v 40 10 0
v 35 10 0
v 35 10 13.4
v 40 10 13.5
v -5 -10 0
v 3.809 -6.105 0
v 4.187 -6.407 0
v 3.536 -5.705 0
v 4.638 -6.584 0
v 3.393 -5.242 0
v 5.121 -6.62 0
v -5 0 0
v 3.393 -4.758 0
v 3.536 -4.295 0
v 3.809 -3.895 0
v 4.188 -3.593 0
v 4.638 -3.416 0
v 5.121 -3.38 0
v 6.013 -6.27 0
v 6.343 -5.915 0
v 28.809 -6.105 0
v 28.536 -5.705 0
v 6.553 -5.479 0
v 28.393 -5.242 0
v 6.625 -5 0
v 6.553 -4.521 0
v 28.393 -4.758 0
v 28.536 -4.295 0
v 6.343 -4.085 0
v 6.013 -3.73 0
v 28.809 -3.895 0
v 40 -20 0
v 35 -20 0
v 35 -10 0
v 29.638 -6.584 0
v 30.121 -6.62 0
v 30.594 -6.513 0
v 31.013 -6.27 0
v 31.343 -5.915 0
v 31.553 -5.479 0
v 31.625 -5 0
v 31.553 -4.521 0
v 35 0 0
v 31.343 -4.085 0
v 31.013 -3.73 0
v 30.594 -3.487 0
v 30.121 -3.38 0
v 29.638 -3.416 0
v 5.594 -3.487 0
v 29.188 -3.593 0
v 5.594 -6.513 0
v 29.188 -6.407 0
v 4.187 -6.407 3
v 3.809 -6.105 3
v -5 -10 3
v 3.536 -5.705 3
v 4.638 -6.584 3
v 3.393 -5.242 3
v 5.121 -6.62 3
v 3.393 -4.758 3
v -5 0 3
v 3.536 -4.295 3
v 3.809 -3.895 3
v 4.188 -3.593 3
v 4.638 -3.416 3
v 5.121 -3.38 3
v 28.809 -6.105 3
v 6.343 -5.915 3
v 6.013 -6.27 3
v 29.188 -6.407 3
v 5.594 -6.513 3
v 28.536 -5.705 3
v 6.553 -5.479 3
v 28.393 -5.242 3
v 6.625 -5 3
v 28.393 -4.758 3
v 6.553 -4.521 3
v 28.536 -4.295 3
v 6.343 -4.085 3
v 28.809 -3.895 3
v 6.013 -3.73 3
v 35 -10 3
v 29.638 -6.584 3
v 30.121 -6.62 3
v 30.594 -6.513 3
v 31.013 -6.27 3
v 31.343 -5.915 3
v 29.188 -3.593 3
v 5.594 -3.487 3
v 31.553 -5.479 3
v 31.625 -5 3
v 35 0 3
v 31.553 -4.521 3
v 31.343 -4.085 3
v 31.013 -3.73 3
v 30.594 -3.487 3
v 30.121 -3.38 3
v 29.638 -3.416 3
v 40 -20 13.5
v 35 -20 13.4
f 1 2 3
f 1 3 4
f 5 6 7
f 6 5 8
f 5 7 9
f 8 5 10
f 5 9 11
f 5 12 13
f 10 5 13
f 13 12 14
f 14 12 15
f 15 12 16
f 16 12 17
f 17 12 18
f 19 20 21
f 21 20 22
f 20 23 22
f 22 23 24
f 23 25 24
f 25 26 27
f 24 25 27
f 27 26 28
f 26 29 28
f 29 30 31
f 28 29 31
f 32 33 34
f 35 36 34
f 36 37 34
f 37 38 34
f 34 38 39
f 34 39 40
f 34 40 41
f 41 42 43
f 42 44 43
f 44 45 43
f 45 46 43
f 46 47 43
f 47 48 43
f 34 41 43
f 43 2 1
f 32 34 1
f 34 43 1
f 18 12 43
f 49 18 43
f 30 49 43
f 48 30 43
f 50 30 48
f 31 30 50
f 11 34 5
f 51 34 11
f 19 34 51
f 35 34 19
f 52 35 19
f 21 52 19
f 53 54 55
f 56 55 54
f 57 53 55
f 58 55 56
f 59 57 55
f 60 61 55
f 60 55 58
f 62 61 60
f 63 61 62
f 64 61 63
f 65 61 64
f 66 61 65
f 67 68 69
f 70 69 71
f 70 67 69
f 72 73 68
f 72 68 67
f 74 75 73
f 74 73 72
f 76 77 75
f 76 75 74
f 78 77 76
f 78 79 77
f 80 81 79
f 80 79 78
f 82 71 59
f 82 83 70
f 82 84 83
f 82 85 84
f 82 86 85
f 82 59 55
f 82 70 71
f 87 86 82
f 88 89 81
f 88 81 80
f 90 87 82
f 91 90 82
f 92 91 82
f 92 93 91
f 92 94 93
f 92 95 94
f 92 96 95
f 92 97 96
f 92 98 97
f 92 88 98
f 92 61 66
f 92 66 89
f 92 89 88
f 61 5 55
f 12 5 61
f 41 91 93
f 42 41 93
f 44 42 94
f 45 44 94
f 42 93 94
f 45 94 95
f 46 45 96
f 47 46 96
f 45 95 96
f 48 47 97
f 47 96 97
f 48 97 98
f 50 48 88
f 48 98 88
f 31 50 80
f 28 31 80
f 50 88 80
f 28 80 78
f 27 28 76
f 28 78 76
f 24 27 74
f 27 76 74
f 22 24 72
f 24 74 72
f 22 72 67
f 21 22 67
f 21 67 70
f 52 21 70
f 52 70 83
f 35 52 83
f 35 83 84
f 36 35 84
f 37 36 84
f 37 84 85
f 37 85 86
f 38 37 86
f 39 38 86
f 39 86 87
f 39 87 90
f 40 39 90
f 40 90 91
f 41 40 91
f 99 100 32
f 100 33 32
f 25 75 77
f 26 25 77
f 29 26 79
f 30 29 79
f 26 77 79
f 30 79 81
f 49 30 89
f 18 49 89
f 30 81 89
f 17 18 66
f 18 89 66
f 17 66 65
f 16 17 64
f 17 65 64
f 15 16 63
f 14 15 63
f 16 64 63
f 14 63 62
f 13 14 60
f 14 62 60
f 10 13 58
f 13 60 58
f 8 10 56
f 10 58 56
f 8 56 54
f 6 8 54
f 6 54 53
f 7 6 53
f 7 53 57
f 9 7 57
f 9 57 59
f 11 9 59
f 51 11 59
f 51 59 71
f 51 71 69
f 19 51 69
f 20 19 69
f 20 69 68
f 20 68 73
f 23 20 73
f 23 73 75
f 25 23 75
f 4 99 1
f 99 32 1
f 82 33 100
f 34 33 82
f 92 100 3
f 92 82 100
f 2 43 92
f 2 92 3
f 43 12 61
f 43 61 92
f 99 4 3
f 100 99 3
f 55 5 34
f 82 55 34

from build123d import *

# Parameters (mm, degrees)
ESQUISSE1_W             = 45
ESQUISSE1_H             = 10
BOSS_EXTRU_1_DEPTH      = 3
ESQUISSE2_R             = 1.625
ENL_V_MAT_EXTRU_1_DEPTH = 4
ESQUISSE3_W             = 5
ESQUISSE3_H             = 3
BOSS_EXTRU_2_DEPTH      = 10
BOSS_EXTRU_2_DEPTH_BACK = 20
ESQUISSE4_W             = 5
ESQUISSE4_H             = 30
BOSS_EXTRU_3_DEPTH      = 10.5
ENL_V_MAT_EXTRU_2_DEPTH = 31


with BuildPart() as part:
    # Esquisse1 → Boss.-Extru.1 (new body)
    with BuildSketch(Plane.XY):
        with Locations((17.5, -5)):
            Rectangle(ESQUISSE1_W, ESQUISSE1_H)
    extrude(amount=BOSS_EXTRU_1_DEPTH)

    # Esquisse2 → Enlèv. mat.-Extru.1 (cut, through all)
    with BuildSketch(Plane.XY.offset(3)):
        with Locations((30, -5)):
            Circle(ESQUISSE2_R)
        with Locations((5, -5)):
            Circle(ESQUISSE2_R)
    extrude(amount=-ENL_V_MAT_EXTRU_1_DEPTH, mode=Mode.SUBTRACT)

    # Esquisse3 → Boss.-Extru.2 (add, two sides)
    with BuildSketch(Plane.XZ.offset(10)) as boss_extru_2_sk:
        with Locations((37.5, 1.5)):
            Rectangle(ESQUISSE3_W, ESQUISSE3_H)
    extrude(amount=BOSS_EXTRU_2_DEPTH)
    extrude(boss_extru_2_sk.sketch, amount=-BOSS_EXTRU_2_DEPTH_BACK)

    # Esquisse4 → Boss.-Extru.3 (add)
    with BuildSketch(Plane.XY.offset(3)):
        with Locations((37.5, -5)):
            Rectangle(ESQUISSE4_W, ESQUISSE4_H)
    extrude(amount=BOSS_EXTRU_3_DEPTH)

    # Esquisse5 → Enlèv. mat.-Extru.2 (cut, through all)
    with BuildSketch(Plane.XZ.offset(20)):
        Polygon((35, 13.5), (40, 13.5), (35, 13.4), align=None)
    extrude(amount=-ENL_V_MAT_EXTRU_2_DEPTH, mode=Mode.SUBTRACT)


solid = part.part
